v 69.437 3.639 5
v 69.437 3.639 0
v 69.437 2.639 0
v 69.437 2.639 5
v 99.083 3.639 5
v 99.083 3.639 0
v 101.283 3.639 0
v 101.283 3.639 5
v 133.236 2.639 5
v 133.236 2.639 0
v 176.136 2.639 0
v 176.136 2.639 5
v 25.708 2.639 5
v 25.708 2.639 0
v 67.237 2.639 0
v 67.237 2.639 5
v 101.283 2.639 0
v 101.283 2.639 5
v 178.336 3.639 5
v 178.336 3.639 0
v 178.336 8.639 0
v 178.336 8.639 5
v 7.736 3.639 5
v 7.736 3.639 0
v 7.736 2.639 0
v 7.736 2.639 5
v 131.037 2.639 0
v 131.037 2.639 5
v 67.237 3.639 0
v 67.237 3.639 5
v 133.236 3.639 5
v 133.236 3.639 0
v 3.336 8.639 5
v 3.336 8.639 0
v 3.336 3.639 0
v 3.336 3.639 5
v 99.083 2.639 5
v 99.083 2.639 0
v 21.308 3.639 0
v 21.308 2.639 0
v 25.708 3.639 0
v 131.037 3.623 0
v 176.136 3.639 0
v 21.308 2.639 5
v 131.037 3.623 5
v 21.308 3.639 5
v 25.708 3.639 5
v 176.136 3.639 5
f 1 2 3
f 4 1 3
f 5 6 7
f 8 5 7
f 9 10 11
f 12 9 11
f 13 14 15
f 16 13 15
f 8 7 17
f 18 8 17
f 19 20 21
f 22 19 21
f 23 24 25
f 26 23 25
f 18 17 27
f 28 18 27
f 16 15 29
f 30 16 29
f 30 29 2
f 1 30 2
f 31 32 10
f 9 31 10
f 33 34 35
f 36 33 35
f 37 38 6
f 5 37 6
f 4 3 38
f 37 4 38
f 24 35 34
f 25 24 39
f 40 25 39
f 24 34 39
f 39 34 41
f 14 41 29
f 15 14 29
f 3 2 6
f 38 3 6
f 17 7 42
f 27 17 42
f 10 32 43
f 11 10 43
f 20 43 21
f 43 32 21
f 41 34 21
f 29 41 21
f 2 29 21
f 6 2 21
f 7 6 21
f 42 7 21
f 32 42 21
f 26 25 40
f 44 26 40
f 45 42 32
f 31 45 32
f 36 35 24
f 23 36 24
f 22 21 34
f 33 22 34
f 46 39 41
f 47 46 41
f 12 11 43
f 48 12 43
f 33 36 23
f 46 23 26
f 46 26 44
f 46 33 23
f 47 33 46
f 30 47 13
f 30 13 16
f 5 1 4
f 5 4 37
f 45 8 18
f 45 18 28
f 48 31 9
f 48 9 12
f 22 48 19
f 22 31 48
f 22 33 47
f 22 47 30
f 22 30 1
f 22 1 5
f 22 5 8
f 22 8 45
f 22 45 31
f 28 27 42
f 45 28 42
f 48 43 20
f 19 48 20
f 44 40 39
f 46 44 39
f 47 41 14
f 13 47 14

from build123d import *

# Parameters (mm, degrees)
EXTRUDE_1_DEPTH = 5


with BuildPart() as part:
    # Model → 凸台-拉伸1 (new body)
    with BuildSketch(Plane.XY):
        Polygon((67.236808621, 3.639203016), (69.436808621, 3.639203016), (69.436808621, 2.639203016), (99.083381953, 2.639203016), (99.083381953, 3.639203016), (101.283381953, 3.639203016), (101.283381953, 2.639203016), (131.03665326, 2.639203016), (131.03665326, 3.62337358), (133.236025848, 3.639203016), (133.236025848, 2.639203016), (176.136025848, 2.639203016), (176.136025848, 3.639203016), (178.336025848, 3.639203016), (178.336025848, 8.639203016), (50.336025848, 8.639203016), (3.336025848, 8.639203016), (3.336025848, 3.639203016), (7.736025848, 3.639203016), (7.736025848, 2.639203016), (21.308226604, 2.639203016), (21.308226604, 3.639203016), (25.708226604, 3.639203016), (25.708226604, 2.639203016), (67.236808621, 2.639203016), align=None)
    extrude(amount=EXTRUDE_1_DEPTH)


solid = part.part
